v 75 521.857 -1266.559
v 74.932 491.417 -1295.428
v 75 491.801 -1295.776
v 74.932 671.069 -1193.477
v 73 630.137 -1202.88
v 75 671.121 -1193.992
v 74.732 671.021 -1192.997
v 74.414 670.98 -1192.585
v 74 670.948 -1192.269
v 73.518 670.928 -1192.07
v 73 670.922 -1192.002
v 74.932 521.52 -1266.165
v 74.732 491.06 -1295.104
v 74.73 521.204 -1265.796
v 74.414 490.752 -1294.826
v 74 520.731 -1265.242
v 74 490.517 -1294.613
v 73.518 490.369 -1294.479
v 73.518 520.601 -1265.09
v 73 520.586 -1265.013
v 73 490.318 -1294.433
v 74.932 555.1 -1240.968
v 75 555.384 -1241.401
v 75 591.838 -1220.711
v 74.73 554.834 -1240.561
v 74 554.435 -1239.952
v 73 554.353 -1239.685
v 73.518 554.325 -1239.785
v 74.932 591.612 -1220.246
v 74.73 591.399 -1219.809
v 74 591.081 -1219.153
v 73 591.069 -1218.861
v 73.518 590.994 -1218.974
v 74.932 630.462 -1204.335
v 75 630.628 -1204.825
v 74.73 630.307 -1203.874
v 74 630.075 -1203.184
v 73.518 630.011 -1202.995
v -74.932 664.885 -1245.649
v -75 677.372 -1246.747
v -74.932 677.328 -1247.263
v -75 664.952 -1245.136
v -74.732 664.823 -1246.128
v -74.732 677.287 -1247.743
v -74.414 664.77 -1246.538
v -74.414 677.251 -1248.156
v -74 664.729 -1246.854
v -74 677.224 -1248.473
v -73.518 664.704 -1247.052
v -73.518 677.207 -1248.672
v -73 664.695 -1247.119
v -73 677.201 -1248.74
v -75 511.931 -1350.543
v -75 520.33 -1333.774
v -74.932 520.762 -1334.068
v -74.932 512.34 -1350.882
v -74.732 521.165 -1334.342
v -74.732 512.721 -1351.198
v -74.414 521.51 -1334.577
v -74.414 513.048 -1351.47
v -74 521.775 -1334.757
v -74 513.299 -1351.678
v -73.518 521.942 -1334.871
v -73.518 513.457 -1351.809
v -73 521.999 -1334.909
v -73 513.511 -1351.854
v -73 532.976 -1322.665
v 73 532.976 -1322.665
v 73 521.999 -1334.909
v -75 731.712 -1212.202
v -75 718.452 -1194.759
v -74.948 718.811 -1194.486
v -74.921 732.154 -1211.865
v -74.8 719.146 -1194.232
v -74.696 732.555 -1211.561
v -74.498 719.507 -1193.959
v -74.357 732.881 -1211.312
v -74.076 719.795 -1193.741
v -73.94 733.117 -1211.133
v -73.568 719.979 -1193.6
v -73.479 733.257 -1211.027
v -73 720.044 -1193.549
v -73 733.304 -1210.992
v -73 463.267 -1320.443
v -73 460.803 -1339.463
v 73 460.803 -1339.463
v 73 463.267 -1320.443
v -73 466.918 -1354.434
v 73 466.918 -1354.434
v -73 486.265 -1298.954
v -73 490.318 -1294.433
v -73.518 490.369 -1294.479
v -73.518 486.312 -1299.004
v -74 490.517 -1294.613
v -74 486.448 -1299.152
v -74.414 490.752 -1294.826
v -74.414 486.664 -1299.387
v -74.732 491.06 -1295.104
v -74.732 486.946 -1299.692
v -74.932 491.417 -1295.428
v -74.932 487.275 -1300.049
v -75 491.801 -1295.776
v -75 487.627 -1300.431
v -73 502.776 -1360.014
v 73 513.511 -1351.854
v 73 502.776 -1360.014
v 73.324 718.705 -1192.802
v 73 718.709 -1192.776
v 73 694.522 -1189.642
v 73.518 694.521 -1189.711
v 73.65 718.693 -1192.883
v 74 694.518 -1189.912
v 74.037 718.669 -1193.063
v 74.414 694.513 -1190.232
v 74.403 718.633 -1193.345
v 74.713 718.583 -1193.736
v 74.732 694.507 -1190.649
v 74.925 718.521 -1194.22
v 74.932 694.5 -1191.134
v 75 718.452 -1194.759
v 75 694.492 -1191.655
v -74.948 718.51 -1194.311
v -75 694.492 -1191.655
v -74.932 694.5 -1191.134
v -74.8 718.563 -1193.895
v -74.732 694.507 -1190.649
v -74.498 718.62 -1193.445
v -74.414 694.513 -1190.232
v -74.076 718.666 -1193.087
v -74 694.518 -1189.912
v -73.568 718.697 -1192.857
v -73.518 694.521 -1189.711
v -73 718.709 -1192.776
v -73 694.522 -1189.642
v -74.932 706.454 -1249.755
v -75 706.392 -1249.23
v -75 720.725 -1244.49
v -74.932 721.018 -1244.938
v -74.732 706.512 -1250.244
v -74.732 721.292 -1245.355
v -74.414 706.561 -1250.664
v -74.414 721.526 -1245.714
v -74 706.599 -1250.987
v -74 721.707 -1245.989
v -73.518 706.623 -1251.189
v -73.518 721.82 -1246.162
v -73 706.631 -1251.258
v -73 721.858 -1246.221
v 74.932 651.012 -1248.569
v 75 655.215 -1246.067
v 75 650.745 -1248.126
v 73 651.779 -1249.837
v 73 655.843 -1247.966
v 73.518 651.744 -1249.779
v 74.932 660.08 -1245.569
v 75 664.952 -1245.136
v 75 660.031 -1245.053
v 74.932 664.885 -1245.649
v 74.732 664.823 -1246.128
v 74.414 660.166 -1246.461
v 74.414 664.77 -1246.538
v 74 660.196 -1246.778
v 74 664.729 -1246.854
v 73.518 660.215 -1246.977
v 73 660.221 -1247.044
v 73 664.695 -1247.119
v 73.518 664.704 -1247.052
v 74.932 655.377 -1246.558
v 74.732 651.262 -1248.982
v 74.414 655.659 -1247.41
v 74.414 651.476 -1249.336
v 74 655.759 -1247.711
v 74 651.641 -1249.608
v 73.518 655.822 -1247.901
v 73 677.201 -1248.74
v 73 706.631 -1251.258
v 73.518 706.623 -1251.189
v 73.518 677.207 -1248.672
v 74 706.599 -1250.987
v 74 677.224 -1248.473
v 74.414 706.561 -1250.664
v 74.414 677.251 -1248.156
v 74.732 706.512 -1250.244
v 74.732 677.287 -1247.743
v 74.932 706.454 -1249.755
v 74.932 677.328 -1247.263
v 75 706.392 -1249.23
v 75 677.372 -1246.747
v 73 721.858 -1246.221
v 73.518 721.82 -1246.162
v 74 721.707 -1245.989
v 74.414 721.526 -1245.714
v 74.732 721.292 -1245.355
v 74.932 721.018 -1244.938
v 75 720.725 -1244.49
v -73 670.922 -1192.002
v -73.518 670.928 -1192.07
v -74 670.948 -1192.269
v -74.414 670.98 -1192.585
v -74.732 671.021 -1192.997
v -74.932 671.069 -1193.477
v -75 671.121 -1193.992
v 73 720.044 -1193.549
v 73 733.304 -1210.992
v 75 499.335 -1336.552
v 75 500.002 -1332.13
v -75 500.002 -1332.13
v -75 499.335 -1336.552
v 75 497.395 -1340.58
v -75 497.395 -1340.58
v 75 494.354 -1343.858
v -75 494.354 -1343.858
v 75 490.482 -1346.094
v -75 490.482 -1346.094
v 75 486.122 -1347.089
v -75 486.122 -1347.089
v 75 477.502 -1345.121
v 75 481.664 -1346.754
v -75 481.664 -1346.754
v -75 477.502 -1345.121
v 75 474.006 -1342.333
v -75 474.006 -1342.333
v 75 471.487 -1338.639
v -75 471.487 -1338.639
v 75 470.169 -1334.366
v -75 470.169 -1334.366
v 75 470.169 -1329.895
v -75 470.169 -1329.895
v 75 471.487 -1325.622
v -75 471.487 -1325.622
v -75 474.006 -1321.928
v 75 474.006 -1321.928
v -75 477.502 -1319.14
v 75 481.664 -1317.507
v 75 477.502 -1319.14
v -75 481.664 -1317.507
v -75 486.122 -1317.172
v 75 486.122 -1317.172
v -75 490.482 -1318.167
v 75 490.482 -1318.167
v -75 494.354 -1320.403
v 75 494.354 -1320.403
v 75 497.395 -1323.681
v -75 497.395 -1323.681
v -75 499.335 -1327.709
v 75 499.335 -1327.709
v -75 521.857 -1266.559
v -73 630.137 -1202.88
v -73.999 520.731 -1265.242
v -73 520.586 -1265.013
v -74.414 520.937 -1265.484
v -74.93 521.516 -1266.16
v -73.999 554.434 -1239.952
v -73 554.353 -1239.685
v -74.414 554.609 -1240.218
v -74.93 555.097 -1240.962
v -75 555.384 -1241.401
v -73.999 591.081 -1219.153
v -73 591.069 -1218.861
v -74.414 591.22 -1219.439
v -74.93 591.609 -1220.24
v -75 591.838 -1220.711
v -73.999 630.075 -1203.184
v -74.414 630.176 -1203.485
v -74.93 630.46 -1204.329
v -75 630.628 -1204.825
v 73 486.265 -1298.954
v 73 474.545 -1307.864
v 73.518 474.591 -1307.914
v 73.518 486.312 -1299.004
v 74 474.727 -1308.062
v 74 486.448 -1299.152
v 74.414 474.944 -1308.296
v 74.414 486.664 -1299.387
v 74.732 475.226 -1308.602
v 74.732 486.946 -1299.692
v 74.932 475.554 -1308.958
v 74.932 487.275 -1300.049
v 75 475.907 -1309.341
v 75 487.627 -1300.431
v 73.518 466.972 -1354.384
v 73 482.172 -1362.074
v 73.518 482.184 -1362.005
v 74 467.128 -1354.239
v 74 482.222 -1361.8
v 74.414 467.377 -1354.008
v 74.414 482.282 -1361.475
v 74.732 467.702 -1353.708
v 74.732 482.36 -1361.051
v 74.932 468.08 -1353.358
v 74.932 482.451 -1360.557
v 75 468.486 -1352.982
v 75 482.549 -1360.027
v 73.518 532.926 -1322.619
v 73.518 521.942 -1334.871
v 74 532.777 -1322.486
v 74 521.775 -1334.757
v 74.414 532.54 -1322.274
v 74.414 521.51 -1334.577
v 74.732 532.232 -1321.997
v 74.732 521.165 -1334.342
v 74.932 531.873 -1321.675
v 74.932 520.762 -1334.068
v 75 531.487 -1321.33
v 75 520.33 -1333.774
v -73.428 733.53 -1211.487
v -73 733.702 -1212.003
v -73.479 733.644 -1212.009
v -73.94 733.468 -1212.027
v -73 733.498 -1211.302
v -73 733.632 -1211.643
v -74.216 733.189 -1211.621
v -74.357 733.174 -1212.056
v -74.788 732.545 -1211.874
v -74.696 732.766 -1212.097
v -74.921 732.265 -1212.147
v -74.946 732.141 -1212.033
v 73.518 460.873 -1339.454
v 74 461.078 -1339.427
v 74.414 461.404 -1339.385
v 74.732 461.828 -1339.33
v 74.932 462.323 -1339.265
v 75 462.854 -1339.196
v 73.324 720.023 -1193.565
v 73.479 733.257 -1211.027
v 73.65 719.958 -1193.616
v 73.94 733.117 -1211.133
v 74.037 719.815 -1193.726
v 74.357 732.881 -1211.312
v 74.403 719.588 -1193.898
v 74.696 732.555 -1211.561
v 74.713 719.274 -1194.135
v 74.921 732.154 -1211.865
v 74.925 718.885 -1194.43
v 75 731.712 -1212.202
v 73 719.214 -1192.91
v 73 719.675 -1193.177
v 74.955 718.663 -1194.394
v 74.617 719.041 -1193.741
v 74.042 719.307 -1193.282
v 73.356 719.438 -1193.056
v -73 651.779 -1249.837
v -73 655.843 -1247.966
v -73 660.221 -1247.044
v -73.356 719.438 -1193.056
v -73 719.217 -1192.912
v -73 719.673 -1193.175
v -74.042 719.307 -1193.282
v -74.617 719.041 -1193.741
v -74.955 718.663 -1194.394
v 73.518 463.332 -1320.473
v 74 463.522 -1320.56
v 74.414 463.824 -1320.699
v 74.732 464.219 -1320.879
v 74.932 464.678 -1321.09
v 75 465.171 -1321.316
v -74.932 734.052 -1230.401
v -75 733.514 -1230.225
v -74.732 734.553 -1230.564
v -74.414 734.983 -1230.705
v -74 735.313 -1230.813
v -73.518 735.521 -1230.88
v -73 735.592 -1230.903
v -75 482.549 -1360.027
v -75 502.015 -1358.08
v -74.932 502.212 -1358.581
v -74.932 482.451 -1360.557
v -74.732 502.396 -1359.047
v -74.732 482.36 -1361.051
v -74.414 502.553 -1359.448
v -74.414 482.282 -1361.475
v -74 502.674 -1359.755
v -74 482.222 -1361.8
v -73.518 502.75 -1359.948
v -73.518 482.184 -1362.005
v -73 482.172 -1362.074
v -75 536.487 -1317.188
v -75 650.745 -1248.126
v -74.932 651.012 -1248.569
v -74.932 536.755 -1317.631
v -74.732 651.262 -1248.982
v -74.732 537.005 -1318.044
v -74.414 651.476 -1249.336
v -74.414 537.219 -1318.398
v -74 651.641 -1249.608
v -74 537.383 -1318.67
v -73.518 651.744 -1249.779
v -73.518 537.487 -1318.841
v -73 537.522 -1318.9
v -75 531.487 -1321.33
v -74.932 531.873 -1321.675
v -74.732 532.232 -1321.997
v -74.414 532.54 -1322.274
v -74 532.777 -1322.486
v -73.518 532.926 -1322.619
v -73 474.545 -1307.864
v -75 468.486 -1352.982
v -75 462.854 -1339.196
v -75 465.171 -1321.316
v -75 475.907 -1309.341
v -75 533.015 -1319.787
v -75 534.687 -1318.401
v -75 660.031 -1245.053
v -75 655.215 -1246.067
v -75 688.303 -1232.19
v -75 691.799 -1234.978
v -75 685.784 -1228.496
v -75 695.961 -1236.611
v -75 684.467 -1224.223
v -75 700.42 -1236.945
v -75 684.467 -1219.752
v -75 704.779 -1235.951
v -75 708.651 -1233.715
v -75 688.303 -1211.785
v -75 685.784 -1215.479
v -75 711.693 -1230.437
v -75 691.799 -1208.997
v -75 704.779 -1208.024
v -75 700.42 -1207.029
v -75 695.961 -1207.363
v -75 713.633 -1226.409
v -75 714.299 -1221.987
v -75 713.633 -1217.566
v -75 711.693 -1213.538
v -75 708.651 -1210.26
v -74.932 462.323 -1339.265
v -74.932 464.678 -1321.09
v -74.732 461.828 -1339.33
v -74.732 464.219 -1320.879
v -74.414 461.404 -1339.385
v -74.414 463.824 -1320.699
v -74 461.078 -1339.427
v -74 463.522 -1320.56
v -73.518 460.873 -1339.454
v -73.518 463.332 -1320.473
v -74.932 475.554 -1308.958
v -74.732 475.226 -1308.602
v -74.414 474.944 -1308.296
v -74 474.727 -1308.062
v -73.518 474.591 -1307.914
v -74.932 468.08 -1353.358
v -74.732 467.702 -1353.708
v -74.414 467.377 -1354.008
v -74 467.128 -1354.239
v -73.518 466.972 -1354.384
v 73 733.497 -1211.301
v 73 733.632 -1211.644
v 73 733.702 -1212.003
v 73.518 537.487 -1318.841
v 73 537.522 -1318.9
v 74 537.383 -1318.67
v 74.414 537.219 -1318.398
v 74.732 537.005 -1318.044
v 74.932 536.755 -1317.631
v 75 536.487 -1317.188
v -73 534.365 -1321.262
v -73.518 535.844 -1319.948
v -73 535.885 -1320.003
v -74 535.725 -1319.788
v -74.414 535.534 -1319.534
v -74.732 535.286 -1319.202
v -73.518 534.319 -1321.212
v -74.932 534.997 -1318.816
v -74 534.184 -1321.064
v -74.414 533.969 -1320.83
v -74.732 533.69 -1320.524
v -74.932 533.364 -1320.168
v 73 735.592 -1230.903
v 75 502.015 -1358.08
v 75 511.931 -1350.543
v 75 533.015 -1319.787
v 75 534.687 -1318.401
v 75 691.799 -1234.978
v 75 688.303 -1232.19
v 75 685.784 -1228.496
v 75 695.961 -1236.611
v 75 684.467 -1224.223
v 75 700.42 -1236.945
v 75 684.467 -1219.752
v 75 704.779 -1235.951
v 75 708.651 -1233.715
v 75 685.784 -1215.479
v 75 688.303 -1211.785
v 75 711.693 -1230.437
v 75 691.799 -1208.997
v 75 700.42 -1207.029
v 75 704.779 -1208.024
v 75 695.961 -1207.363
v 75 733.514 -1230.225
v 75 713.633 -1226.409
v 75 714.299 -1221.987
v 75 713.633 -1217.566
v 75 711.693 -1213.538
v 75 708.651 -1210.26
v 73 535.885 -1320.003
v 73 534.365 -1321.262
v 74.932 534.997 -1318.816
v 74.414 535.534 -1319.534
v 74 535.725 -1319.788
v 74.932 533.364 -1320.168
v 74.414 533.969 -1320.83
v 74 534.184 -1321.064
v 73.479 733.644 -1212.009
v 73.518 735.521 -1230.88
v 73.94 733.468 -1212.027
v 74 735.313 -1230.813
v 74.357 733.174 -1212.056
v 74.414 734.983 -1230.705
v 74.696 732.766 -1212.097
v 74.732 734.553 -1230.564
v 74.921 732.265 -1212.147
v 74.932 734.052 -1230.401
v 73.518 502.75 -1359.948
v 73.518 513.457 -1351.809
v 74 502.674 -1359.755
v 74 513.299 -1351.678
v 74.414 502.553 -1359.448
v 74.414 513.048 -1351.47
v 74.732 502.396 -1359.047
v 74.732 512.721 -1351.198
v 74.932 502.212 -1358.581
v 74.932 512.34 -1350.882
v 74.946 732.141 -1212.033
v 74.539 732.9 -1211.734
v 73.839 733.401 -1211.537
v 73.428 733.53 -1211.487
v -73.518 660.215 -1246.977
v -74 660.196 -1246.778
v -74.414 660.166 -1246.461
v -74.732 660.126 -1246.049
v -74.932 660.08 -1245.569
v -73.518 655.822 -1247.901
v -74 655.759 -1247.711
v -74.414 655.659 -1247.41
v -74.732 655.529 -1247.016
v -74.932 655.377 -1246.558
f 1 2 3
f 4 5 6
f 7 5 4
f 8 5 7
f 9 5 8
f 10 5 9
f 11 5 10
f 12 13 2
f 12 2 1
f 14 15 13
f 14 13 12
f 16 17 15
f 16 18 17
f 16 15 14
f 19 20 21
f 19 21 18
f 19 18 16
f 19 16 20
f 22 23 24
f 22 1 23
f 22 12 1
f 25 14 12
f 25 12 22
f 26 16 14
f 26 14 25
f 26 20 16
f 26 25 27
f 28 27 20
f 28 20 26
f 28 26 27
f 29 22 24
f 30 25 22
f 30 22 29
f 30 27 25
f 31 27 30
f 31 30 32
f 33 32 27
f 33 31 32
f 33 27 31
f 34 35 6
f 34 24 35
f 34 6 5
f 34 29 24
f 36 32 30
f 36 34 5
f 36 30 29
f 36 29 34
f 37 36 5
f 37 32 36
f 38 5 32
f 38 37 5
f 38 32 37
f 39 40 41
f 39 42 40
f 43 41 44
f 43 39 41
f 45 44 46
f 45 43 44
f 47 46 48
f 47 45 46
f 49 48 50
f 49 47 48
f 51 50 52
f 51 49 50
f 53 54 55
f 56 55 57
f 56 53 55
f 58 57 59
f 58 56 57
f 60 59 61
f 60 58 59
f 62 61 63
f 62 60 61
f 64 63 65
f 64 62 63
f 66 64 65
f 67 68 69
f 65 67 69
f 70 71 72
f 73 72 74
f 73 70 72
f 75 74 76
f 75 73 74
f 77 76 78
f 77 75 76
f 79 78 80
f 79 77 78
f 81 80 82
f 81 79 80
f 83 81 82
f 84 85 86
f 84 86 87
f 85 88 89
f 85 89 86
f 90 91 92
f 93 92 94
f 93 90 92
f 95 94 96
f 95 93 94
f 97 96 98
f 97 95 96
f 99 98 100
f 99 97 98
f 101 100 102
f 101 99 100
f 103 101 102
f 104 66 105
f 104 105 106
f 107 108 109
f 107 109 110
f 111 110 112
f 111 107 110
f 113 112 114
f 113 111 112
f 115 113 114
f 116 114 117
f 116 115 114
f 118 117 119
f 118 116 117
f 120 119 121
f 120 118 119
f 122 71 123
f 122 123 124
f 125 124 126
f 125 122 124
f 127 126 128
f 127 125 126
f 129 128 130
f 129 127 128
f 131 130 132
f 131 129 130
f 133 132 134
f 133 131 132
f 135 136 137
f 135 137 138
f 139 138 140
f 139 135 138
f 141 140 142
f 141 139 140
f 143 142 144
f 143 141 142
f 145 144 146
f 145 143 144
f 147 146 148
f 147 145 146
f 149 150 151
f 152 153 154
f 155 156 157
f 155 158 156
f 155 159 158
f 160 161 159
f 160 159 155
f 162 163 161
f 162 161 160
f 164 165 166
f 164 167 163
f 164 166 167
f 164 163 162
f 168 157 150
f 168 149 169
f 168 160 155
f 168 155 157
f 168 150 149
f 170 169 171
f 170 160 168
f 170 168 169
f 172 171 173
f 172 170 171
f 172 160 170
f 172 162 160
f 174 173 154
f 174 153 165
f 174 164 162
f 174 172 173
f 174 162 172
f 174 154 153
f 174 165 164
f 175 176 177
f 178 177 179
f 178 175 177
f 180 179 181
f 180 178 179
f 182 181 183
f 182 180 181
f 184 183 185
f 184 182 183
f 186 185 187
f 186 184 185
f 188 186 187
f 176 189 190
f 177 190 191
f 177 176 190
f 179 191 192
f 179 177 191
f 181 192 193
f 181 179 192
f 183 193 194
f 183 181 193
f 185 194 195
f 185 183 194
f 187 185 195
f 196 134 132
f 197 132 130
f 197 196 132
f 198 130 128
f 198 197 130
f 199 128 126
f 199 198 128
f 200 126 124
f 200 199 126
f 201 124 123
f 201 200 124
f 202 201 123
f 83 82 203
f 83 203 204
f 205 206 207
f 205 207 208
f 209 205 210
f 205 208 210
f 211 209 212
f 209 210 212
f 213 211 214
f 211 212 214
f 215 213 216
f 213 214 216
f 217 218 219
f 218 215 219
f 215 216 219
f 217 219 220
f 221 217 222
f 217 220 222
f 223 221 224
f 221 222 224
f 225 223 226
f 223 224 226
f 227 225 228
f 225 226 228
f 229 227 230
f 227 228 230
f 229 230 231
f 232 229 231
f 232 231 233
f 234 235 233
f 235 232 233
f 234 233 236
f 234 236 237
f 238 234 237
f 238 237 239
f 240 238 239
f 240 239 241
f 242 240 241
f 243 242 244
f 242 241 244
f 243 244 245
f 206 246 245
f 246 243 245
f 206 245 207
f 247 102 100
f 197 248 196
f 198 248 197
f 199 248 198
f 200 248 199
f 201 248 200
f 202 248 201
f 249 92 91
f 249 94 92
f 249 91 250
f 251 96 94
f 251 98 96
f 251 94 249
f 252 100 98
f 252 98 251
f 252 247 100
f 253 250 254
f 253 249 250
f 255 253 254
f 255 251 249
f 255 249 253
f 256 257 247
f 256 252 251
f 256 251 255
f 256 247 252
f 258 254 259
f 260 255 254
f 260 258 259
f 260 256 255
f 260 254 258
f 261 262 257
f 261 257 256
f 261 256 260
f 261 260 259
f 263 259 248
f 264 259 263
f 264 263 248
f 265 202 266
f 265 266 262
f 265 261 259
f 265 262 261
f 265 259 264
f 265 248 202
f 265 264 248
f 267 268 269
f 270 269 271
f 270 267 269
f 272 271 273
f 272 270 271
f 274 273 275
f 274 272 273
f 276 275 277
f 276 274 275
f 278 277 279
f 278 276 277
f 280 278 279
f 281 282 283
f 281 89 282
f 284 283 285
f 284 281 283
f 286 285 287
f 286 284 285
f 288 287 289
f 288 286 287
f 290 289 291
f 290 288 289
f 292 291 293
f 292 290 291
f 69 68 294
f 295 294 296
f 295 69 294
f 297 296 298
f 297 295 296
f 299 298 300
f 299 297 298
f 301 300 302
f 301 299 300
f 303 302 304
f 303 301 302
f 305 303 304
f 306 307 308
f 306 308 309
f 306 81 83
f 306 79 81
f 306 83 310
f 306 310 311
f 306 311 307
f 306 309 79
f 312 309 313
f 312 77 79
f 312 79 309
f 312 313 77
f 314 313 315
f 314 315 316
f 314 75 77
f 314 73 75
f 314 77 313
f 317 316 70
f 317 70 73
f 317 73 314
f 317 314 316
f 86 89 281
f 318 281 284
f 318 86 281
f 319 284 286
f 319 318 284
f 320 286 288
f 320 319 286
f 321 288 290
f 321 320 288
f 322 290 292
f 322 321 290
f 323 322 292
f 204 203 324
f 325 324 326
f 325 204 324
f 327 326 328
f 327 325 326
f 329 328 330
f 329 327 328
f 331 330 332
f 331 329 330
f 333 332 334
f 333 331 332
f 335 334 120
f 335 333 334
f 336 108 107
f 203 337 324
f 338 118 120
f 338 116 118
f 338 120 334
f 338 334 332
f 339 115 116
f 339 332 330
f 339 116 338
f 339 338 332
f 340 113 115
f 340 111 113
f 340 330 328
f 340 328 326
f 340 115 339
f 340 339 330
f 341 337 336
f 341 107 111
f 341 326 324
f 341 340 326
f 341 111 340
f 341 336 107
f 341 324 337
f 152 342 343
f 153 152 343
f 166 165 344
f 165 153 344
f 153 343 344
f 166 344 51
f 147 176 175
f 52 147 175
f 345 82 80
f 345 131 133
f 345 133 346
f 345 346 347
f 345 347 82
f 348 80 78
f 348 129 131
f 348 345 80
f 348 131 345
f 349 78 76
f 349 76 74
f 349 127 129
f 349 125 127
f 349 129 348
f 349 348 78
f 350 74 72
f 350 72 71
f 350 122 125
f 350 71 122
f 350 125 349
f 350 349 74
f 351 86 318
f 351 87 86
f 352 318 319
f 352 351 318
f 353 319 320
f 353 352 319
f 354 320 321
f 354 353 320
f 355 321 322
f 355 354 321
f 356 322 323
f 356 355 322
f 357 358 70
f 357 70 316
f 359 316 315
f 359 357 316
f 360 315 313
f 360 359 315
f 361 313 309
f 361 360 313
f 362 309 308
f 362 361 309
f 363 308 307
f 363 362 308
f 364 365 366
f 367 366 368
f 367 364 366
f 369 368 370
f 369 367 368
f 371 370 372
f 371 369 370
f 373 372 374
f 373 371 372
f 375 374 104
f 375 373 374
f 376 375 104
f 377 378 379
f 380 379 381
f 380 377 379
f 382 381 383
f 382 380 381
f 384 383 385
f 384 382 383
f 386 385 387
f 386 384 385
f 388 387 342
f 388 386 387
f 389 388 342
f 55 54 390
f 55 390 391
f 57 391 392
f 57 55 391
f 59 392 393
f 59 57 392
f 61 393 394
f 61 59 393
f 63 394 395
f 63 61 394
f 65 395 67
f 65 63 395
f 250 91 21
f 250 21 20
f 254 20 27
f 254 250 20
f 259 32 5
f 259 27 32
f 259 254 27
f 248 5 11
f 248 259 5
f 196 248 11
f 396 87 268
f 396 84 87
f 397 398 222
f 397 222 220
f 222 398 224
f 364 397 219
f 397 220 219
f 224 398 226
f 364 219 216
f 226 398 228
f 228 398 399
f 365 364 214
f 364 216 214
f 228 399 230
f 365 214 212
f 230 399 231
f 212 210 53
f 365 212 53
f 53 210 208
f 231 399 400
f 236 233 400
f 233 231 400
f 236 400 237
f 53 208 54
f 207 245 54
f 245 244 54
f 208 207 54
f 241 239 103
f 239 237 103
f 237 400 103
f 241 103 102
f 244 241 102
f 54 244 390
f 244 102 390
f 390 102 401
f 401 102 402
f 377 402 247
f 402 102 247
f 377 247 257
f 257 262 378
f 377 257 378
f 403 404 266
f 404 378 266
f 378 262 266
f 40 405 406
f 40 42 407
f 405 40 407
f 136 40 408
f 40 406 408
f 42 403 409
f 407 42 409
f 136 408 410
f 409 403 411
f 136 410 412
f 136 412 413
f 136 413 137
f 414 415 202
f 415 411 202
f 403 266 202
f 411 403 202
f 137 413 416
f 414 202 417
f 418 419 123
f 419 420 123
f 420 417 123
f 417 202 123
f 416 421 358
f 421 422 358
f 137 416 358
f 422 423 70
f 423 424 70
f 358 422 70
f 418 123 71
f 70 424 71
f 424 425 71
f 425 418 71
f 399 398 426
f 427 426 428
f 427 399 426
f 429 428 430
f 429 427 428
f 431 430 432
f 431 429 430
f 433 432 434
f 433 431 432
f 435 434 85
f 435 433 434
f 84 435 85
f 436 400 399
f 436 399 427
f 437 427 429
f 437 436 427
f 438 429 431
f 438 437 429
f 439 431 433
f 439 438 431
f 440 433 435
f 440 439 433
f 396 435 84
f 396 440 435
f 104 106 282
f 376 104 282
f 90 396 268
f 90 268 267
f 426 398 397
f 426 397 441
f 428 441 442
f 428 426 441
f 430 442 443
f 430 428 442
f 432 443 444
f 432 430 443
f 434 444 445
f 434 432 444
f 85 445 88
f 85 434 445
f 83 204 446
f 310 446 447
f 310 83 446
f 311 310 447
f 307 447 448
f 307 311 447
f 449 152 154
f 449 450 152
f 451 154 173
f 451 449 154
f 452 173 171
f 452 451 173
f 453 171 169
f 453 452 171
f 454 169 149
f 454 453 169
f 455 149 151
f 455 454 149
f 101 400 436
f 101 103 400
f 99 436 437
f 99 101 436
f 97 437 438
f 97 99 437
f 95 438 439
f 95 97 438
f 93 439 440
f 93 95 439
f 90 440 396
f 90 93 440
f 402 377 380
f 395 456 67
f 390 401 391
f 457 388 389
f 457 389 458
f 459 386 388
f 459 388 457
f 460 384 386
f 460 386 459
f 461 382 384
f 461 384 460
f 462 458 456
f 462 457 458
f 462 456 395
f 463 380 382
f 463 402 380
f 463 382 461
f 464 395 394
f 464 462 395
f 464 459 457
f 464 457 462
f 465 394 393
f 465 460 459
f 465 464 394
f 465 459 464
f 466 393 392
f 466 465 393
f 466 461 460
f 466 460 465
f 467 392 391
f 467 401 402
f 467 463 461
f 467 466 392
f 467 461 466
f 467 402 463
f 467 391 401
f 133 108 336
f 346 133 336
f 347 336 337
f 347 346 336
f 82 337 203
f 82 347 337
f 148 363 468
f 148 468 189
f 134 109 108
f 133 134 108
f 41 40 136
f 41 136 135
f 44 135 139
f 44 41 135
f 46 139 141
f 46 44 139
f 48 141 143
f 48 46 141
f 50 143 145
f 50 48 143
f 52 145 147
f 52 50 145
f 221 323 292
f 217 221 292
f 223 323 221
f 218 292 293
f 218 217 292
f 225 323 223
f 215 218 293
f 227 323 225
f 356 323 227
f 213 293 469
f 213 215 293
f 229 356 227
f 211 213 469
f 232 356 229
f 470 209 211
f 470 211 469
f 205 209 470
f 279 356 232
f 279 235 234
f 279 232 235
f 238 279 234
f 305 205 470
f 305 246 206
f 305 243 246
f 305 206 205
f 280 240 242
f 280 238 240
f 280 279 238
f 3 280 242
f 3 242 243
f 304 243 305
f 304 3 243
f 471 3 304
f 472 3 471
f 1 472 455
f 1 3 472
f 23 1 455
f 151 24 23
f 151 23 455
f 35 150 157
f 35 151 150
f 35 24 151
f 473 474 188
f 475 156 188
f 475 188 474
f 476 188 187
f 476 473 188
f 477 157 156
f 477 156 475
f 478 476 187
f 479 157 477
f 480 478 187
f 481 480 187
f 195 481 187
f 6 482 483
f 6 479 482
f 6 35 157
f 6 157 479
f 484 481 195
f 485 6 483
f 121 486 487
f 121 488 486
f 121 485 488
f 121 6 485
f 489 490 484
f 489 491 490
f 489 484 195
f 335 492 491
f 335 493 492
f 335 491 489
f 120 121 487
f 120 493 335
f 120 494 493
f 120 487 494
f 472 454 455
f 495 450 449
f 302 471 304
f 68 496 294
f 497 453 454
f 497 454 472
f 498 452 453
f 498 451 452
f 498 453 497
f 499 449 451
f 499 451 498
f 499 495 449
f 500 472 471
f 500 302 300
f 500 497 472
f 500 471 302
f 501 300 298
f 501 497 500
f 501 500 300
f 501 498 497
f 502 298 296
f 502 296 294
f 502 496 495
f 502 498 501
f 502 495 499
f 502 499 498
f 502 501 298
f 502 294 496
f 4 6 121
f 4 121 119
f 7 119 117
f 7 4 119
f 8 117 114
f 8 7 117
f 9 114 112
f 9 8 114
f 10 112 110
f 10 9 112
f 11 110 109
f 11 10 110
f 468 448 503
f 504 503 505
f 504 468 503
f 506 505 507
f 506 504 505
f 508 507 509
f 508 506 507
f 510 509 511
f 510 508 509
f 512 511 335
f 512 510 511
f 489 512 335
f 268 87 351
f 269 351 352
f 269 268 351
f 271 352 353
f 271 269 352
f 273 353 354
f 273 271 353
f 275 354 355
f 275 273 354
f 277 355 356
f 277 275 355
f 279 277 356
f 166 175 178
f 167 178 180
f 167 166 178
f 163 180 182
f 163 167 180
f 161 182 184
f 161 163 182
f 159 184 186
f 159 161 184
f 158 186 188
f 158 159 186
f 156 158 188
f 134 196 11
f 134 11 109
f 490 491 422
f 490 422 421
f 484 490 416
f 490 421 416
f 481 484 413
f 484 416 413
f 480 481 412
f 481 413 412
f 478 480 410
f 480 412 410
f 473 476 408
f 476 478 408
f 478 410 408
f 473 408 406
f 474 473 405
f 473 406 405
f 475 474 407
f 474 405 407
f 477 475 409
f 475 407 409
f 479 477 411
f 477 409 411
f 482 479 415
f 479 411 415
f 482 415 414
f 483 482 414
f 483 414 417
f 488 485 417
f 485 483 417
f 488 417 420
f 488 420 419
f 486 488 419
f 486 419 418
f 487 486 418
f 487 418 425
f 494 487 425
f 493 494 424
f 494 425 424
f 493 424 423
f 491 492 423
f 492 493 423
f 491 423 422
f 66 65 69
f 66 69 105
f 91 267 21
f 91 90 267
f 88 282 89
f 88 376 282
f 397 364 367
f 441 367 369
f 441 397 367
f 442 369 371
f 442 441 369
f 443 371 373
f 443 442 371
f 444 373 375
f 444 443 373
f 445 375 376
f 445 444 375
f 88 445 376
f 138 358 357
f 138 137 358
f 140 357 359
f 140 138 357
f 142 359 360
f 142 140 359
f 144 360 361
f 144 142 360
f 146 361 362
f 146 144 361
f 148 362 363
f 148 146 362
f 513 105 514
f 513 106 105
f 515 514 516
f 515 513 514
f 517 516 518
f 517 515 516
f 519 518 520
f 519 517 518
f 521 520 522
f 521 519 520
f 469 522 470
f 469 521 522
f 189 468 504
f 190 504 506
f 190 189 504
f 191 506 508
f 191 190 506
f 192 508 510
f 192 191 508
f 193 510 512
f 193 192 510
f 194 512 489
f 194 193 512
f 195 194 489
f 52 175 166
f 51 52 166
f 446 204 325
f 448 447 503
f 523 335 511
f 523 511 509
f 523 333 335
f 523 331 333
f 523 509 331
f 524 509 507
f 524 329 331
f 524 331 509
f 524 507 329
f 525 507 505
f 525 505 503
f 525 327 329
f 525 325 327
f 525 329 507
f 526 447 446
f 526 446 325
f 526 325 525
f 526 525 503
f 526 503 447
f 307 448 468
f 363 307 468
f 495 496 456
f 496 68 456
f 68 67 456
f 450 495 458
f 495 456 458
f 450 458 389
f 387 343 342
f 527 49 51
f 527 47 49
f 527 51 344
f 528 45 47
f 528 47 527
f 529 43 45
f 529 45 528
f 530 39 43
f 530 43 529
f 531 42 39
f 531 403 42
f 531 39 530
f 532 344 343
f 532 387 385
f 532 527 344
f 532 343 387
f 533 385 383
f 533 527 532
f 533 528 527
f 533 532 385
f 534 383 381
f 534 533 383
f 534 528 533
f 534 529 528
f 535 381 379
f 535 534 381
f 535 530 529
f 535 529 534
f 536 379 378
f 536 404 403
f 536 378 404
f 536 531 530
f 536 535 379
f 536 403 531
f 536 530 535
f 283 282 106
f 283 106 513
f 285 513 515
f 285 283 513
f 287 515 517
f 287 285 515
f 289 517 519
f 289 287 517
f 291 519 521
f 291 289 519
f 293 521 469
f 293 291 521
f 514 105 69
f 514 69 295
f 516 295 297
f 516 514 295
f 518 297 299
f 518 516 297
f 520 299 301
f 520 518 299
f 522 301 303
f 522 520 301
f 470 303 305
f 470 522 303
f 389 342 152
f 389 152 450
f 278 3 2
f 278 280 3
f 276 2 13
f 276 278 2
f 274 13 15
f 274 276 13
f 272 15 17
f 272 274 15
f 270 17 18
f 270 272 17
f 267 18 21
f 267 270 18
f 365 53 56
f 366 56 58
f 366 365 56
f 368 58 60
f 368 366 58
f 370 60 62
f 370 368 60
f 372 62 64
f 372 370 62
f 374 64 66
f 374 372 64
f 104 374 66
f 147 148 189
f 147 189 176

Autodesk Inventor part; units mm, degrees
ref_plane "YZ Plane" through (0, 0, 0) normal (1, 0, 0) x (0, 1, 0)
ref_plane "XZ Plane" through (0, 0, 0) normal (0, 1, 0) x (-1, 0, 0)
ref_plane "XY Plane" through (0, 0, 0) normal (0, 0, 1) x (1, 0, 0)
sketch "Sketch1" plane through (0, 0, 0) normal (1, 0, 0) x (0, 1, 0)
  line L0 (2812.3869, 0) -> (2812.3869, -5171.1623) construction
  line L1 (2812.3869, -5171.1623) -> (0, -5171.1623) construction
  line L2 (0, -5171.1623) -> (0, 0) construction
  line L3 (0, 0) -> (2812.3869, 0) construction
  point P0 (0, 0)
sketch "Sketch3" plane through (0, 0, 0) normal (1, 0, 0) x (0, 1, 0)
  arc A0 (670.9217, -1192.002) -> (490.3182, -1294.4333) centre (735.6427, -1516.5486) ccw
  circle A1 centre (699.299, -1221.9874) radius 15
  circle A2 centre (485.0015, -1332.1305) radius 15
  line L0 (670.9217, -1192.002) -> (694.5217, -1189.6422)
  line L1 (694.5217, -1189.6422) -> (719.5378, -1192.8832)
  line L2 (719.5378, -1192.8832) -> (733.6455, -1211.4411)
  line L3 (733.6455, -1211.4411) -> (735.5916, -1230.9034)
  line L4 (735.5916, -1230.9034) -> (721.8585, -1246.2211)
  line L5 (721.8585, -1246.2211) -> (706.6308, -1251.2582)
  line L6 (706.6308, -1251.2582) -> (677.2013, -1248.7397)
  line L7 (677.2013, -1248.7397) -> (657.762, -1246.2211)
  line L8 (657.762, -1246.2211) -> (534.9682, -1320.4431)
  line L9 (534.9682, -1320.4431) -> (521.9986, -1334.9093)
  line L10 (521.9986, -1334.9093) -> (513.5108, -1351.8536)
  line L11 (513.5108, -1351.8536) -> (502.7761, -1360.014)
  line L12 (502.7761, -1360.014) -> (482.1715, -1362.0744)
  line L13 (482.1715, -1362.0744) -> (466.9183, -1354.4337)
  line L14 (466.9183, -1354.4337) -> (460.8027, -1339.4632)
  line L15 (460.8027, -1339.4632) -> (463.2669, -1320.4431)
  line L16 (463.2669, -1320.4431) -> (474.5449, -1307.8638)
  line L17 (474.5449, -1307.8638) -> (486.2652, -1298.954)
  line L18 (486.2652, -1298.954) -> (490.3182, -1294.4333)
  point P0 (0, 0)
  dimension "d9" = 30
  dimension "d10" = 30
extrude "Extrusion2" add sketch "Sketch3" along normal mid plane 150
fillet "Fillet1" radius 20 2 edges at (0, 657.762, -1246.2211) (0, 534.9682, -1320.4431)
fillet "Fillet2" radius 2 42 edges at (75, 572.3788, -1228.6872) (75, 488.2917, -1296.6937) (75, 480.405, -1303.4089) (75, 468.9059, -1314.1535) (75, 462.0348, -1329.9531) (75, 463.8605, -1346.9484) (75, 474.5449, -1358.254) (75, 492.4738, -1361.0442) (75, 508.1435, -1355.9338) (75, 517.7547, -1343.3815) (75, 527.4874, -1328.7871) (75, 535.1095, -1320.6136) (75, 594.6506, -1284.3684) (75, 670.948, -1247.9295) (75, 691.916, -1249.9989) (75, 714.2446, -1248.7397) (75, 728.725, -1238.5623) (75, 734.6185, -1221.1723) (75, 726.5916, -1202.1622) (75, 707.0298, -1191.2627) (75, 682.7217, -1190.8221) (-75, 572.3788, -1228.6872) (-75, 682.7217, -1190.8221) (-75, 707.0298, -1191.2627) (-75, 726.5916, -1202.1622) (-75, 734.6185, -1221.1723) (-75, 728.725, -1238.5623) (-75, 714.2446, -1248.7397) (-75, 691.916, -1249.9989) (-75, 670.948, -1247.9295) (-75, 594.6506, -1284.3684) (-75, 535.1095, -1320.6136) (-75, 527.4874, -1328.7871) (-75, 517.7547, -1343.3815) (-75, 508.1435, -1355.9338) (-75, 492.4738, -1361.0442) (-75, 474.5449, -1358.254) (-75, 463.8605, -1346.9484) (-75, 462.0348, -1329.9531) (-75, 468.9059, -1314.1535) (-75, 480.405, -1303.4089) (-75, 488.2917, -1296.6937)
fillet "Fillet3" radius 2 6 edges at (0, 719.5378, -1192.8832) (0, 733.6455, -1211.4411) (74.4142, 719.2197, -1193.4327) (-74.4142, 719.2197, -1193.4327) (74.4142, 733.079, -1211.6639) (-74.4142, 733.079, -1211.6639)
properties part number "Lankarm_lång"
